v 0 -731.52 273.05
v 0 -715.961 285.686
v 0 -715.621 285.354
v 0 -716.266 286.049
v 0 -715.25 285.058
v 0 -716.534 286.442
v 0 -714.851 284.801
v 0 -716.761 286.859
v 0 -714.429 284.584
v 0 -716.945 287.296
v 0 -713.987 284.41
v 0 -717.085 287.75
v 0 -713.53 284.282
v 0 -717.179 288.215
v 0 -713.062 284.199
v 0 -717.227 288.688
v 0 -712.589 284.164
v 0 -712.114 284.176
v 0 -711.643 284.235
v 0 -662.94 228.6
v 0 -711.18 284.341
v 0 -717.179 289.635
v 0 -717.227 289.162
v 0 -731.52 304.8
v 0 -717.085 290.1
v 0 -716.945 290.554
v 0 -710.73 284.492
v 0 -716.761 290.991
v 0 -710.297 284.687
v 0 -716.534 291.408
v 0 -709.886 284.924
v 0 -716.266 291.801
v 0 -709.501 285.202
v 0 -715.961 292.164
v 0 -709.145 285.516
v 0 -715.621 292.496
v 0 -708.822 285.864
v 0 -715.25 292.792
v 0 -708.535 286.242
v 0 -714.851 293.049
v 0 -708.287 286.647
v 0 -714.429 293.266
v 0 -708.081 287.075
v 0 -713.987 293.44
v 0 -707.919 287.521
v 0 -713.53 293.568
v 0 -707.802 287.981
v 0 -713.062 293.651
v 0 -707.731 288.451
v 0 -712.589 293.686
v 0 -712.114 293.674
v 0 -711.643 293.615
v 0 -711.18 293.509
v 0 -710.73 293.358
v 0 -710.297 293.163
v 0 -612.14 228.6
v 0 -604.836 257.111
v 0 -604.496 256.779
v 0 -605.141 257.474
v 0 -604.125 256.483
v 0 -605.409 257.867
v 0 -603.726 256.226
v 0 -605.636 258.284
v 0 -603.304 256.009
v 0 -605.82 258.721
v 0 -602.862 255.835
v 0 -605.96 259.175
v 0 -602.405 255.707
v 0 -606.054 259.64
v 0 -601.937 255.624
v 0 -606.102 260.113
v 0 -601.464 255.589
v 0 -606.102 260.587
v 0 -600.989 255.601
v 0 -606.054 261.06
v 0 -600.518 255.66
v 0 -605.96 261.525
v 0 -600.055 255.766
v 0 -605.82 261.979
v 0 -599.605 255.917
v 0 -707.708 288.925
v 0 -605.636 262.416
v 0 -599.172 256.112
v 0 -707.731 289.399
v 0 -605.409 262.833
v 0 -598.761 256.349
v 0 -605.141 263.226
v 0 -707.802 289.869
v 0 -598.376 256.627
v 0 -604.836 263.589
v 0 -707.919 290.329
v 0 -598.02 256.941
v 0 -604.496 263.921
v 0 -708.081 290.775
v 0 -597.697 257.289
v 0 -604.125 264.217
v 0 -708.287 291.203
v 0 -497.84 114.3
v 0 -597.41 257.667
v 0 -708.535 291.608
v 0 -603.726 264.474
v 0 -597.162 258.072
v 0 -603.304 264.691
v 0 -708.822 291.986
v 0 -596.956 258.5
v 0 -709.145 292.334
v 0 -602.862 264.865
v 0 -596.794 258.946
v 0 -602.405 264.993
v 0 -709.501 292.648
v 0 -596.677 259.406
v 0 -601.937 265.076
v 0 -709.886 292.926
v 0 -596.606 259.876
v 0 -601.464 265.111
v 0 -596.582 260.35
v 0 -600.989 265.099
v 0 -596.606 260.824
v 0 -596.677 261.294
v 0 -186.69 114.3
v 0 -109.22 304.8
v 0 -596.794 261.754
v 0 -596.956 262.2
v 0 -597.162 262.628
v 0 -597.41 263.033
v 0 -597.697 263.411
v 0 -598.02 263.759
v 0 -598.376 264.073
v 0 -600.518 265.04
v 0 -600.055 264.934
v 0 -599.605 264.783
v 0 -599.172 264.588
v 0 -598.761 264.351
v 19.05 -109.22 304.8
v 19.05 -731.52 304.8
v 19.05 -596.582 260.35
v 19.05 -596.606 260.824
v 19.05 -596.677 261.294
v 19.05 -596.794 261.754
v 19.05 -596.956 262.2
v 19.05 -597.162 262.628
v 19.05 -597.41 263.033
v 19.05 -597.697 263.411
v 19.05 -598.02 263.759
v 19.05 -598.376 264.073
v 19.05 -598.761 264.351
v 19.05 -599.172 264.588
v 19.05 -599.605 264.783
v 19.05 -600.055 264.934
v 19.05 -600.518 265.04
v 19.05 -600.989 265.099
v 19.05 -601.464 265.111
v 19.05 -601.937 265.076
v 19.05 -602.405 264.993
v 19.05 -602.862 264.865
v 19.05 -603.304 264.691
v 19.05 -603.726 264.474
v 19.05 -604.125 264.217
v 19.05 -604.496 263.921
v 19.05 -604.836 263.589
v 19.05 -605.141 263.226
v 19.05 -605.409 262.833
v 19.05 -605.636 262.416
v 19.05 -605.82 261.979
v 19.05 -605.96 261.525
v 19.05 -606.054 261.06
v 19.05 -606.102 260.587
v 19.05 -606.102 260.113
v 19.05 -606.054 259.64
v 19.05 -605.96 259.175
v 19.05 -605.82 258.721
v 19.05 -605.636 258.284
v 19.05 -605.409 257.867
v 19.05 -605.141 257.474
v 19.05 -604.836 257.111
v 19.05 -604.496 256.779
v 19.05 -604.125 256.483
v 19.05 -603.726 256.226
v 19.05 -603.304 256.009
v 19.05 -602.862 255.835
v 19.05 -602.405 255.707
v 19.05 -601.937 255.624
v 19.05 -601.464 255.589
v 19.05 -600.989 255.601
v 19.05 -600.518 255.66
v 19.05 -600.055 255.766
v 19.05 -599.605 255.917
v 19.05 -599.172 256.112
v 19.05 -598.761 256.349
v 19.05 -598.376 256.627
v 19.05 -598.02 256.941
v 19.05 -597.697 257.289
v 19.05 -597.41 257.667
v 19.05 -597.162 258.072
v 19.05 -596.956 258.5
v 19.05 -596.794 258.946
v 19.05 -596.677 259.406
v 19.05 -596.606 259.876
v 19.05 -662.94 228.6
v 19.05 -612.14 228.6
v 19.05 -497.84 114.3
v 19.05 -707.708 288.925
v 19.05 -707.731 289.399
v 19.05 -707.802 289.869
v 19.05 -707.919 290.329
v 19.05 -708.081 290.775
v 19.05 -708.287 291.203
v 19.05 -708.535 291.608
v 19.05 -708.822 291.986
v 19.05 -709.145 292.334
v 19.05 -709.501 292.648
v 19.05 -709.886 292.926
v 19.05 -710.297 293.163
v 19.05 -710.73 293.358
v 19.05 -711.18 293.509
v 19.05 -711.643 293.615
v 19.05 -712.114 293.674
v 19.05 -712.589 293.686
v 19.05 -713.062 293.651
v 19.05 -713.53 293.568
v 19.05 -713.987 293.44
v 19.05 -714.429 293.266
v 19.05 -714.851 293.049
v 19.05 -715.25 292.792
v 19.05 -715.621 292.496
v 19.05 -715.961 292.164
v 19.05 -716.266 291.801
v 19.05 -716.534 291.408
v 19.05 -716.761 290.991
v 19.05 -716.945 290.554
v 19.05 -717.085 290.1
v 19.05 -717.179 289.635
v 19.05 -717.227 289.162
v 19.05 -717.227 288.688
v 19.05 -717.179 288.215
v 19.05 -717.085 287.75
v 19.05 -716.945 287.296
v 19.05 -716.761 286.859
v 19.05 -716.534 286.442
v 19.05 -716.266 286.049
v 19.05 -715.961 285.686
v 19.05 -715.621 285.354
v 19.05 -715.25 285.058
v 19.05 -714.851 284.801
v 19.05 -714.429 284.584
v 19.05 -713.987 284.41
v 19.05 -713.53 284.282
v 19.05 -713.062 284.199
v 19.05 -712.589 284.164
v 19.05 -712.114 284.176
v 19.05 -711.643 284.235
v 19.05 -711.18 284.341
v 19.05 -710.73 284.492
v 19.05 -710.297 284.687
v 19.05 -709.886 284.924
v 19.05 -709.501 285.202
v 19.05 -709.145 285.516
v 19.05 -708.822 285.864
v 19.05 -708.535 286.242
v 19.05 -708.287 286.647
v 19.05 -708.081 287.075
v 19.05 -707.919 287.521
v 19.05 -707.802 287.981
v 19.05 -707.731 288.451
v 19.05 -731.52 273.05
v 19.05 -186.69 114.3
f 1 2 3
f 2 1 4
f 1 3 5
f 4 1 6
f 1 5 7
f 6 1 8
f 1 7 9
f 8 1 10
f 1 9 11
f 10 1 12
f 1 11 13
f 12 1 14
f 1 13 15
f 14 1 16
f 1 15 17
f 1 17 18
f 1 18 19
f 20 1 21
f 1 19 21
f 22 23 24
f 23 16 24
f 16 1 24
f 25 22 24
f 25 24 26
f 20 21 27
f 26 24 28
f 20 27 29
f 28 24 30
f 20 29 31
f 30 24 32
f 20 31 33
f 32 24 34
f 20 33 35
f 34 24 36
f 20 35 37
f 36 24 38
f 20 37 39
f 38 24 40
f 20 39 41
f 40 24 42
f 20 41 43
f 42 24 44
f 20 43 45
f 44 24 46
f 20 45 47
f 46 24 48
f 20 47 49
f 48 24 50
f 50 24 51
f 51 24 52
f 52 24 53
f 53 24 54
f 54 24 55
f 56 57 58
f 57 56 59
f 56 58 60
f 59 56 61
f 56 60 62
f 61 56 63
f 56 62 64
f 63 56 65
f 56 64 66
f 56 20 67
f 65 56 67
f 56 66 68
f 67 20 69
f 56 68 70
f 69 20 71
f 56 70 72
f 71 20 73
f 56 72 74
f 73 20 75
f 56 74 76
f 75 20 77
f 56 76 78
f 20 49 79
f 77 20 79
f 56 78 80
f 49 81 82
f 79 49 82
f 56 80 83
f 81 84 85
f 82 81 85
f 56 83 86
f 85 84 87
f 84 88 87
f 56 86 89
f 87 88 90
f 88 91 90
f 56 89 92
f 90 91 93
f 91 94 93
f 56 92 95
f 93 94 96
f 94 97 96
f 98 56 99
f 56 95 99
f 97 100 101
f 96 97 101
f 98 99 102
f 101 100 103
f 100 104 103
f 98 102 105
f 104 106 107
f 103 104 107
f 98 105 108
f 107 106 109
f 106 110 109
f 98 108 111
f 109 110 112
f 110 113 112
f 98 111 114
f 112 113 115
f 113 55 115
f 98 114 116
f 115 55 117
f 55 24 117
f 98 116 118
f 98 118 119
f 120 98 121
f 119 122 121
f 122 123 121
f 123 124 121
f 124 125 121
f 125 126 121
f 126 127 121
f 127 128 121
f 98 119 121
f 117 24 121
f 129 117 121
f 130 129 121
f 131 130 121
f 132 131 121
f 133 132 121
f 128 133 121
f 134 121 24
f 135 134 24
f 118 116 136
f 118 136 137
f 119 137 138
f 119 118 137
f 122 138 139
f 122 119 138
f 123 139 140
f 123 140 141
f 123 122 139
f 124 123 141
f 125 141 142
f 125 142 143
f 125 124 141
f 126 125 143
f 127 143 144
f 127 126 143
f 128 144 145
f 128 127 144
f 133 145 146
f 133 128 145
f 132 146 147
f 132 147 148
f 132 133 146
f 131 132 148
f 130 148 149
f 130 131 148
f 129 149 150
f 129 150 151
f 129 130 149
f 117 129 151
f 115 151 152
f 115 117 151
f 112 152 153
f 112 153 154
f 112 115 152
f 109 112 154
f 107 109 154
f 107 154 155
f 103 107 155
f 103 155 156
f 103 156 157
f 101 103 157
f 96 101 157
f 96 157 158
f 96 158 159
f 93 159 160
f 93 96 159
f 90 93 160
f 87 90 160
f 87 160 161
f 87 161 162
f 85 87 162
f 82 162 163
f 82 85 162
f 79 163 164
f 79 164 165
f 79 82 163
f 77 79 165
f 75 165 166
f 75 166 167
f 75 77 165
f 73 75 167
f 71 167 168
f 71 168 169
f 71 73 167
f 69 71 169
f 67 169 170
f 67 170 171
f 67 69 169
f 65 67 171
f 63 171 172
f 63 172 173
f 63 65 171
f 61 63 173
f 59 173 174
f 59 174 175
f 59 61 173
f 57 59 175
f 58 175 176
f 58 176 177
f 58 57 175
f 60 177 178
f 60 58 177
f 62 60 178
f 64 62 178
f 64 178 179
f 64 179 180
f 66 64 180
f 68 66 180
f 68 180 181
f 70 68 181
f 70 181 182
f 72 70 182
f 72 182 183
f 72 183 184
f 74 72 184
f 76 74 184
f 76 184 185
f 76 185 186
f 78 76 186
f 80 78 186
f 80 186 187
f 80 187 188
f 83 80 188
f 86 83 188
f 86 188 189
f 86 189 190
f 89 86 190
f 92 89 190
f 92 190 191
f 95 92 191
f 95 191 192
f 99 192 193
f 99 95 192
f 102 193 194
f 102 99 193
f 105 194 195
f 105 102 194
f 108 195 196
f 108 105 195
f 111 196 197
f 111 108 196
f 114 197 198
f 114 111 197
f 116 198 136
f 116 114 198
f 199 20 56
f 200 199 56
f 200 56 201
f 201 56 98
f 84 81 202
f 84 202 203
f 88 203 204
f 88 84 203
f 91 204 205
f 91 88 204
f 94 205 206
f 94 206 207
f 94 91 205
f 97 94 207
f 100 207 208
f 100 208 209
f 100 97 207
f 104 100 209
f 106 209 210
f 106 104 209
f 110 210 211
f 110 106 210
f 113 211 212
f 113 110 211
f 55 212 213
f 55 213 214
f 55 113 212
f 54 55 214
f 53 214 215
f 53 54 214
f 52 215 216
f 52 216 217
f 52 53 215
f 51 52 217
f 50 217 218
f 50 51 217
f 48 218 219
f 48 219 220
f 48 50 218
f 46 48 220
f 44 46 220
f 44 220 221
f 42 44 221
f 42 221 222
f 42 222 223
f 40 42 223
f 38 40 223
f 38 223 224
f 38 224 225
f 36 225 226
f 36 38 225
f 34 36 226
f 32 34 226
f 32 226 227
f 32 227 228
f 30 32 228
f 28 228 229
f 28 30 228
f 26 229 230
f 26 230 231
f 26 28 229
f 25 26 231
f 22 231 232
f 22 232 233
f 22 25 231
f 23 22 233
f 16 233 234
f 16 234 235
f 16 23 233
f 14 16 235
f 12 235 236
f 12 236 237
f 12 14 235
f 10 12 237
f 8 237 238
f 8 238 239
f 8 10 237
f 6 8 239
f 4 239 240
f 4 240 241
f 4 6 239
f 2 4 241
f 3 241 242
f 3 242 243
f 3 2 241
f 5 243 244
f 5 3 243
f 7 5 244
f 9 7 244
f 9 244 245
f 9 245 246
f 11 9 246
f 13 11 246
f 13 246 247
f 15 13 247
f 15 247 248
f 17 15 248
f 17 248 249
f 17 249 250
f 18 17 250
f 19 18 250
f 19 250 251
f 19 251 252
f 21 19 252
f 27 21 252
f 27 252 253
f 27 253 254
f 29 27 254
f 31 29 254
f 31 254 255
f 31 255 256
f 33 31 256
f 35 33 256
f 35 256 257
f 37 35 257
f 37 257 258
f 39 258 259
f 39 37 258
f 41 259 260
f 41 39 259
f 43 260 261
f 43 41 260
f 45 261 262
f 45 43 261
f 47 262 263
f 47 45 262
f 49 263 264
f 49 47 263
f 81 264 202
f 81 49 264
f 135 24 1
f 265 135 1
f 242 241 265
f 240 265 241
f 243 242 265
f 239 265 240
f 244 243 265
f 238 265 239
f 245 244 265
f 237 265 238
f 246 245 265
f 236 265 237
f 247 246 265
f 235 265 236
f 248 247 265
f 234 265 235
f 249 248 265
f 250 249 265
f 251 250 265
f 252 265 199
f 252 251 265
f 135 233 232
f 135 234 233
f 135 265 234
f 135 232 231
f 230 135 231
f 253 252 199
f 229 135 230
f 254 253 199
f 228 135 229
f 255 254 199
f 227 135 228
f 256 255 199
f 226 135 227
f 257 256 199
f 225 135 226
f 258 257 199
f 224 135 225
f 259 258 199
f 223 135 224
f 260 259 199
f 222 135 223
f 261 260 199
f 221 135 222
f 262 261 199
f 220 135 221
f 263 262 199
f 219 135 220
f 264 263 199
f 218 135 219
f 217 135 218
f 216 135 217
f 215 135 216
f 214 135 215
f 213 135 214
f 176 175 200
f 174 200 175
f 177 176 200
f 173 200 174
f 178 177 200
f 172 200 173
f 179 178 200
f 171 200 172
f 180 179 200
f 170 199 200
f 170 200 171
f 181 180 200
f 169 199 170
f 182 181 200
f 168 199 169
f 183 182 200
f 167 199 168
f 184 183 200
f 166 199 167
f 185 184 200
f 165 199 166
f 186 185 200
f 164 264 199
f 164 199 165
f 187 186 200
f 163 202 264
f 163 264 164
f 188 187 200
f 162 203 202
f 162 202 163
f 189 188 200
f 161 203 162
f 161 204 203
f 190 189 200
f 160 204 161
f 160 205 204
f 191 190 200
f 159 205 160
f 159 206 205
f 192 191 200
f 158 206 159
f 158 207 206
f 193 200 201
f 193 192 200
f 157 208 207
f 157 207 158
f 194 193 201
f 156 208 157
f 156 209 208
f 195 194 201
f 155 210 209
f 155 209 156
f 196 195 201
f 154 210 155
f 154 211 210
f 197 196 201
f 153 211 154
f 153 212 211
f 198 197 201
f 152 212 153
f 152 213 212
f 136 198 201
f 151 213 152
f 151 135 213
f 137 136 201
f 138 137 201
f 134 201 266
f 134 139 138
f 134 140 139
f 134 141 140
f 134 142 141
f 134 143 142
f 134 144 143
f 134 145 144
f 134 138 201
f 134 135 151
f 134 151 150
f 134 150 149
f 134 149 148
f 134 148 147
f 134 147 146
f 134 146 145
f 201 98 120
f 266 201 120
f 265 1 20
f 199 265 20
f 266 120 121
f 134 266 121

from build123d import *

# Parameters (mm, degrees)
F2_R     = 4.7625
F3_DEPTH = 19.05


with BuildPart() as f3:
    # F2 (on Right) → F3 (new body)
    with BuildSketch(Plane.YZ):
        Polygon((-612.14, 228.6), (-497.84, 114.3), (-186.69, 114.3), (-109.22, 304.8), (-731.52, 304.8), (-731.52, 273.05), (-662.94, 228.6), align=None)
        with Locations((-601.345, 260.35)):
            Circle(F2_R, mode=Mode.SUBTRACT)
        with Locations((-712.47, 288.925)):
            Circle(F2_R, mode=Mode.SUBTRACT)
    extrude(amount=F3_DEPTH)


solid = f3.part
